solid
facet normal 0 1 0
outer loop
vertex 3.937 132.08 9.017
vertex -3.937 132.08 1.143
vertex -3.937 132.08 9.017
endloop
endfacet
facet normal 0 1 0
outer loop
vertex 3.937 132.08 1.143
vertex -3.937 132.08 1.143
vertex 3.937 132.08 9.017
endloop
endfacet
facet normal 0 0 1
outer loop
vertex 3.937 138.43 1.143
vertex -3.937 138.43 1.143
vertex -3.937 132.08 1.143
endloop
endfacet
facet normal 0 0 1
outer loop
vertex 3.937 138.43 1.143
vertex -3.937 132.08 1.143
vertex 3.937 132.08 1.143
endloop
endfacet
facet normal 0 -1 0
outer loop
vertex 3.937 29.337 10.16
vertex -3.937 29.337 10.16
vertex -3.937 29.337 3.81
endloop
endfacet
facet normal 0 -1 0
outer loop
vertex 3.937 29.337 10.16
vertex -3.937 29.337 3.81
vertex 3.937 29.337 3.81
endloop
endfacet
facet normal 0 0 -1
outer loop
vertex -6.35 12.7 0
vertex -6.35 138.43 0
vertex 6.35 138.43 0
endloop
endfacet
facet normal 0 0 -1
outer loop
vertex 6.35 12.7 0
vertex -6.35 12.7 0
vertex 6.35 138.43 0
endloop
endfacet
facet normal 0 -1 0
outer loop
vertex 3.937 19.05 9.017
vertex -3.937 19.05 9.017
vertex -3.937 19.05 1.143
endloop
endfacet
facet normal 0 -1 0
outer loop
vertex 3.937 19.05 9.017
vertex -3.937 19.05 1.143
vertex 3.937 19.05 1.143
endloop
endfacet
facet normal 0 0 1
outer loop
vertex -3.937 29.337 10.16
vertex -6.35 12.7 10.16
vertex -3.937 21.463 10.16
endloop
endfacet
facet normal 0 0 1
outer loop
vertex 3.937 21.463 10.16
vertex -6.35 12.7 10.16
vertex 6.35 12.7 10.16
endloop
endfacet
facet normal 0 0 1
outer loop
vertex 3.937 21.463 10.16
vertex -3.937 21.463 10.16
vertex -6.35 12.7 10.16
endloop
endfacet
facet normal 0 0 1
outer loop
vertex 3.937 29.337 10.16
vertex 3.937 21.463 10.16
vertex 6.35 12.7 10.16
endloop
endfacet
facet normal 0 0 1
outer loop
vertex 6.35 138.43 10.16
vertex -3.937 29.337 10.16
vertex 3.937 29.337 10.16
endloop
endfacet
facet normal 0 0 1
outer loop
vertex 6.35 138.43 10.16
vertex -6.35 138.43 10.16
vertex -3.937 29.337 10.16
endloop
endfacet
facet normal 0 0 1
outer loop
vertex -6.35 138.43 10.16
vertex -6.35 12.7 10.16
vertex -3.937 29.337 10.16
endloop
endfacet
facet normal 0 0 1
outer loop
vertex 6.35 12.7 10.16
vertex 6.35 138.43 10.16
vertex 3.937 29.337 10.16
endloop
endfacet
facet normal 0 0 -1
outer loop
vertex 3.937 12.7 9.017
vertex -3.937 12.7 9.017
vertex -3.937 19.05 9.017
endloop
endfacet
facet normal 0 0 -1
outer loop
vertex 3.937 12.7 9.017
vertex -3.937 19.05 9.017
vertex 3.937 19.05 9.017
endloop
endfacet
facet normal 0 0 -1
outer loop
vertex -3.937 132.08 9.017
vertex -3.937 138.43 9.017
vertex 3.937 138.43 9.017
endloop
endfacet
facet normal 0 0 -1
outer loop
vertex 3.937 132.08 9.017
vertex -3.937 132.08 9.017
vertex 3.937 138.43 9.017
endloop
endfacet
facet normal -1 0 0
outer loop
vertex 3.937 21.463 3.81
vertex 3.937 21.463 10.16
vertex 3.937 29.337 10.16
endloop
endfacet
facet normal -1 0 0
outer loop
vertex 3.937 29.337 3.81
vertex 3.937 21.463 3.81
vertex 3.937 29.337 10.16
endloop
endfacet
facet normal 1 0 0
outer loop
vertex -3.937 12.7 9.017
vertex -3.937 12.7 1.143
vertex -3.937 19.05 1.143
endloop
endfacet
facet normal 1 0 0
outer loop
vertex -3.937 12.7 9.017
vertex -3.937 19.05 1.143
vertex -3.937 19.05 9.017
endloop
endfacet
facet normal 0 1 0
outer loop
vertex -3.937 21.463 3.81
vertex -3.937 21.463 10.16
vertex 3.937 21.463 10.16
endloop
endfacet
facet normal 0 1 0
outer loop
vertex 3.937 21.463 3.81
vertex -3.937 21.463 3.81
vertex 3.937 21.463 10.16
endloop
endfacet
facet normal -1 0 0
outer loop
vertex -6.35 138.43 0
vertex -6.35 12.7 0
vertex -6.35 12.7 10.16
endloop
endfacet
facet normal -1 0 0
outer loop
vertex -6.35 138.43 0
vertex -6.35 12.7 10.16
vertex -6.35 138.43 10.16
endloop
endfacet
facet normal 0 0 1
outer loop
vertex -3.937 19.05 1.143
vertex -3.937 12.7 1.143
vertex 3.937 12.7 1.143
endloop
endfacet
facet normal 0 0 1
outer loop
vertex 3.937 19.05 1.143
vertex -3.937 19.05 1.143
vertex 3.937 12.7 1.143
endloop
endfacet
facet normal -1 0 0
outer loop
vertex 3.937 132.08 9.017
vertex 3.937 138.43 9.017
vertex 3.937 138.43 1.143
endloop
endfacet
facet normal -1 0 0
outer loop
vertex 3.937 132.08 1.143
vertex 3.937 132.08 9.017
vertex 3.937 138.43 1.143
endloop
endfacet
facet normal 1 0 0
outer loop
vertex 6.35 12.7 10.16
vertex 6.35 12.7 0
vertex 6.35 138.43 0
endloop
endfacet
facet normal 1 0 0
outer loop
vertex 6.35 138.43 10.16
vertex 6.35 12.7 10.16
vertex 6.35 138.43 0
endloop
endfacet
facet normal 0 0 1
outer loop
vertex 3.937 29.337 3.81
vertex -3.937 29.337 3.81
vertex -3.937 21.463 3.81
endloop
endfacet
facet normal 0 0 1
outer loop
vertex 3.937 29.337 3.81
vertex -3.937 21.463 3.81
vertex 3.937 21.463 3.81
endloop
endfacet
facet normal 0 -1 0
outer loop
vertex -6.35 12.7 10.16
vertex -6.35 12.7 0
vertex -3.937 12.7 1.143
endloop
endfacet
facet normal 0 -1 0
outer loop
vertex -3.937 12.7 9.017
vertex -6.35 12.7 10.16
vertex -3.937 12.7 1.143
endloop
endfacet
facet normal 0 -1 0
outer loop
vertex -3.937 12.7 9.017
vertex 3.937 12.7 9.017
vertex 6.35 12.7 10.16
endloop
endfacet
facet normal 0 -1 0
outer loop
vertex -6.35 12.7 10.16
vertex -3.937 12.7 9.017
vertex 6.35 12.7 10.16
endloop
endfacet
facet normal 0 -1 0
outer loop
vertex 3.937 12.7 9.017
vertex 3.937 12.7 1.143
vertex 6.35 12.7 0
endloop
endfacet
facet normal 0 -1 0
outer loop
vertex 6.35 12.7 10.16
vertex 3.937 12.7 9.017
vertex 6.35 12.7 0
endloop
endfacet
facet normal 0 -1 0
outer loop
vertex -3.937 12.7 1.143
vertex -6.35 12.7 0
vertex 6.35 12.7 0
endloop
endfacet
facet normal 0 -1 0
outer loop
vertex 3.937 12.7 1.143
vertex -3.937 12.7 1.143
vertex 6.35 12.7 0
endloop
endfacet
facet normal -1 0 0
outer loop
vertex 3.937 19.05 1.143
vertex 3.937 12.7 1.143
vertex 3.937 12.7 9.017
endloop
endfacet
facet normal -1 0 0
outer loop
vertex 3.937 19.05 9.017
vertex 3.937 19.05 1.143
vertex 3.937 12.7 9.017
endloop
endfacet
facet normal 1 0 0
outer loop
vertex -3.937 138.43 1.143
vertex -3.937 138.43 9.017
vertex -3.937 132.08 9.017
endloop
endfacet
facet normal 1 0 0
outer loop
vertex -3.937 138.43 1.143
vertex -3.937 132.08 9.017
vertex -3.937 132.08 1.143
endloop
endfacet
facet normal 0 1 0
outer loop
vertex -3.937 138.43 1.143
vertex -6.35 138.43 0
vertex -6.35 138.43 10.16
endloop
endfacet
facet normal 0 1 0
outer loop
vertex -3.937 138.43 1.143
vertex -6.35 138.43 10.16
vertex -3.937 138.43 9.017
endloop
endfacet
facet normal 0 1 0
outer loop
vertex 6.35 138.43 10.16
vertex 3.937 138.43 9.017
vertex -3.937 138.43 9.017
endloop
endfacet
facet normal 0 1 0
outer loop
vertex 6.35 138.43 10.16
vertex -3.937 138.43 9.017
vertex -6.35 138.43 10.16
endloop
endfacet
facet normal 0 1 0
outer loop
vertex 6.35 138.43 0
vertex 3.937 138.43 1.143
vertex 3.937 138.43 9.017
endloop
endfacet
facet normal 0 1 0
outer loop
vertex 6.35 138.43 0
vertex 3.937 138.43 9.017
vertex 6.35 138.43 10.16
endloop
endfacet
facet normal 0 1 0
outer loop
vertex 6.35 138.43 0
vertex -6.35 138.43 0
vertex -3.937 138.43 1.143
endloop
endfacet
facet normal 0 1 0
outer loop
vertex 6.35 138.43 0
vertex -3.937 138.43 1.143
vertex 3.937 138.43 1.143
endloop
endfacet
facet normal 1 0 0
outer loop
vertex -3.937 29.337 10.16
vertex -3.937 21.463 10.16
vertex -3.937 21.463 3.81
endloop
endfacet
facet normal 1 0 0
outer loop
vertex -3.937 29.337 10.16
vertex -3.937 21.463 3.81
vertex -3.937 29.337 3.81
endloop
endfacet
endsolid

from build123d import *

# Parameters (mm, degrees)
SKETCH1_W           = 12.7
SKETCH1_H           = 125.73
BOSS_EXTRUDE1_DEPTH = 10.16
SKETCH4_W           = 7.874
SKETCH4_H           = 7.874
CUT_EXTRUDE2_DEPTH  = 6.35
SKETCH6_W           = 7.874
SKETCH6_H           = 7.874
CUT_EXTRUDE4_DEPTH  = 6.35
SKETCH8_W           = 7.874
SKETCH8_H           = 7.874
CUT_EXTRUDE5_DEPTH  = 6.35


with BuildPart() as part:
    # Sketch1 → Boss-Extrude1 (new body)
    with BuildSketch(Plane.XY):
        with Locations((0, 75.565)):
            Rectangle(SKETCH1_W, SKETCH1_H)
    extrude(amount=BOSS_EXTRUDE1_DEPTH)

    # Sketch4 → Cut-Extrude2 (cut)
    with BuildSketch(Plane(origin=(0, 138.43, 0), x_dir=(1, 0, 0), z_dir=(0, 1, 0))):
        with Locations((0, -5.08)):
            Rectangle(SKETCH4_W, SKETCH4_H)
    extrude(amount=-CUT_EXTRUDE2_DEPTH, mode=Mode.SUBTRACT)

    # Sketch6 → Cut-Extrude4 (cut)
    with BuildSketch(Plane.XY.offset(10.16)):
        with Locations((0, 25.4)):
            Rectangle(SKETCH6_W, SKETCH6_H)
    extrude(amount=-CUT_EXTRUDE4_DEPTH, mode=Mode.SUBTRACT)

    # Sketch8 → Cut-Extrude5 (cut)
    with BuildSketch(Plane.XZ.offset(-12.7)):
        with Locations((0, 5.08)):
            Rectangle(SKETCH8_W, SKETCH8_H)
    extrude(amount=-CUT_EXTRUDE5_DEPTH, mode=Mode.SUBTRACT)


solid = part.part
